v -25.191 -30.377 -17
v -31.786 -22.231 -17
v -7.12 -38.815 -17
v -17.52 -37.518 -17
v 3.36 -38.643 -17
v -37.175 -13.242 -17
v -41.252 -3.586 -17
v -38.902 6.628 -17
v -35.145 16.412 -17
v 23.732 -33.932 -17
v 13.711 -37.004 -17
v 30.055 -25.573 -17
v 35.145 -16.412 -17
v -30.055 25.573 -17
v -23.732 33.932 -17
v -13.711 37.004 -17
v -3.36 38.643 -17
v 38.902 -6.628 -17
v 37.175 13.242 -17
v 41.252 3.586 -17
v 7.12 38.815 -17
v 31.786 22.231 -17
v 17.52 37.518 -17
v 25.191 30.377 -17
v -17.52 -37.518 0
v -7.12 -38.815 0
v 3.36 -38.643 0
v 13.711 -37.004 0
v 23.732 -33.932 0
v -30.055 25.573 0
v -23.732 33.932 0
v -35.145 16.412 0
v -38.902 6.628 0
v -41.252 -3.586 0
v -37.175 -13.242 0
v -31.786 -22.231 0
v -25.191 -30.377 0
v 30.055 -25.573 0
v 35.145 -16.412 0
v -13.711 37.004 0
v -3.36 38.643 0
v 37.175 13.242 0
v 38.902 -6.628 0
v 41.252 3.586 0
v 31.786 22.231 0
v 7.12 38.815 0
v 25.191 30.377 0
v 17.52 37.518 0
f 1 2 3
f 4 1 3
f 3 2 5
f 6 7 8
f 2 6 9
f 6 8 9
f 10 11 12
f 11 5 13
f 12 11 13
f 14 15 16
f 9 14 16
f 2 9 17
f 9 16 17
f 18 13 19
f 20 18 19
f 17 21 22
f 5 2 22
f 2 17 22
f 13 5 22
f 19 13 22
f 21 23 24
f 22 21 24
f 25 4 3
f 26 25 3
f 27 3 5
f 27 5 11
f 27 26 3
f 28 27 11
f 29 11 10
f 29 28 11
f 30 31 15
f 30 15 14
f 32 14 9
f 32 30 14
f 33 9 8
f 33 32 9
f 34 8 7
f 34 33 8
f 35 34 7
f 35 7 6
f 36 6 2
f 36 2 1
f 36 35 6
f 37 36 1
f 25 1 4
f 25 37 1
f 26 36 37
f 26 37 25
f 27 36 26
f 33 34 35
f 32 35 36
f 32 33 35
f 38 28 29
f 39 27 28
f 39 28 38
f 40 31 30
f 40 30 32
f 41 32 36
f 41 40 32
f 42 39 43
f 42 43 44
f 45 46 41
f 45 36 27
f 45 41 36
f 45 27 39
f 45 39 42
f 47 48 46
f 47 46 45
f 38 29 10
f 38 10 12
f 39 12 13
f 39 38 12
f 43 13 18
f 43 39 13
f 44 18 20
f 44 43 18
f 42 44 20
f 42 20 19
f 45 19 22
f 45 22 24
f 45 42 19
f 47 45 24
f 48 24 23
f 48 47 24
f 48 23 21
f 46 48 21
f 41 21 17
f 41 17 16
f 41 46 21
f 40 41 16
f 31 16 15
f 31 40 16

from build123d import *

# Parameters (mm, degrees)
F1_DEPTH = 17


with BuildPart() as f1:
    # F0 (on Top) → F1 (new body)
    with BuildSketch(Plane.XY):
        with BuildLine():
            ThreePointArc((-17.519922, -37.518273), (3.359597, -38.642575), (23.731816, -33.931834))
            ThreePointArc((23.731816, -33.931834), (35.145251, -16.411791), (41.251738, 3.586439))
            ThreePointArc((41.251738, 3.586439), (31.785653, 22.230784), (17.519922, 37.518273))
            ThreePointArc((17.519922, 37.518273), (-3.359597, 38.642575), (-23.731816, 33.931834))
            ThreePointArc((-23.731816, 33.931834), (-35.145251, 16.411791), (-41.251738, -3.586439))
            ThreePointArc((-41.251738, -3.586439), (-31.785653, -22.230784), (-17.519922, -37.518273))
        make_face()
    extrude(amount=-F1_DEPTH)


solid = f1.part
